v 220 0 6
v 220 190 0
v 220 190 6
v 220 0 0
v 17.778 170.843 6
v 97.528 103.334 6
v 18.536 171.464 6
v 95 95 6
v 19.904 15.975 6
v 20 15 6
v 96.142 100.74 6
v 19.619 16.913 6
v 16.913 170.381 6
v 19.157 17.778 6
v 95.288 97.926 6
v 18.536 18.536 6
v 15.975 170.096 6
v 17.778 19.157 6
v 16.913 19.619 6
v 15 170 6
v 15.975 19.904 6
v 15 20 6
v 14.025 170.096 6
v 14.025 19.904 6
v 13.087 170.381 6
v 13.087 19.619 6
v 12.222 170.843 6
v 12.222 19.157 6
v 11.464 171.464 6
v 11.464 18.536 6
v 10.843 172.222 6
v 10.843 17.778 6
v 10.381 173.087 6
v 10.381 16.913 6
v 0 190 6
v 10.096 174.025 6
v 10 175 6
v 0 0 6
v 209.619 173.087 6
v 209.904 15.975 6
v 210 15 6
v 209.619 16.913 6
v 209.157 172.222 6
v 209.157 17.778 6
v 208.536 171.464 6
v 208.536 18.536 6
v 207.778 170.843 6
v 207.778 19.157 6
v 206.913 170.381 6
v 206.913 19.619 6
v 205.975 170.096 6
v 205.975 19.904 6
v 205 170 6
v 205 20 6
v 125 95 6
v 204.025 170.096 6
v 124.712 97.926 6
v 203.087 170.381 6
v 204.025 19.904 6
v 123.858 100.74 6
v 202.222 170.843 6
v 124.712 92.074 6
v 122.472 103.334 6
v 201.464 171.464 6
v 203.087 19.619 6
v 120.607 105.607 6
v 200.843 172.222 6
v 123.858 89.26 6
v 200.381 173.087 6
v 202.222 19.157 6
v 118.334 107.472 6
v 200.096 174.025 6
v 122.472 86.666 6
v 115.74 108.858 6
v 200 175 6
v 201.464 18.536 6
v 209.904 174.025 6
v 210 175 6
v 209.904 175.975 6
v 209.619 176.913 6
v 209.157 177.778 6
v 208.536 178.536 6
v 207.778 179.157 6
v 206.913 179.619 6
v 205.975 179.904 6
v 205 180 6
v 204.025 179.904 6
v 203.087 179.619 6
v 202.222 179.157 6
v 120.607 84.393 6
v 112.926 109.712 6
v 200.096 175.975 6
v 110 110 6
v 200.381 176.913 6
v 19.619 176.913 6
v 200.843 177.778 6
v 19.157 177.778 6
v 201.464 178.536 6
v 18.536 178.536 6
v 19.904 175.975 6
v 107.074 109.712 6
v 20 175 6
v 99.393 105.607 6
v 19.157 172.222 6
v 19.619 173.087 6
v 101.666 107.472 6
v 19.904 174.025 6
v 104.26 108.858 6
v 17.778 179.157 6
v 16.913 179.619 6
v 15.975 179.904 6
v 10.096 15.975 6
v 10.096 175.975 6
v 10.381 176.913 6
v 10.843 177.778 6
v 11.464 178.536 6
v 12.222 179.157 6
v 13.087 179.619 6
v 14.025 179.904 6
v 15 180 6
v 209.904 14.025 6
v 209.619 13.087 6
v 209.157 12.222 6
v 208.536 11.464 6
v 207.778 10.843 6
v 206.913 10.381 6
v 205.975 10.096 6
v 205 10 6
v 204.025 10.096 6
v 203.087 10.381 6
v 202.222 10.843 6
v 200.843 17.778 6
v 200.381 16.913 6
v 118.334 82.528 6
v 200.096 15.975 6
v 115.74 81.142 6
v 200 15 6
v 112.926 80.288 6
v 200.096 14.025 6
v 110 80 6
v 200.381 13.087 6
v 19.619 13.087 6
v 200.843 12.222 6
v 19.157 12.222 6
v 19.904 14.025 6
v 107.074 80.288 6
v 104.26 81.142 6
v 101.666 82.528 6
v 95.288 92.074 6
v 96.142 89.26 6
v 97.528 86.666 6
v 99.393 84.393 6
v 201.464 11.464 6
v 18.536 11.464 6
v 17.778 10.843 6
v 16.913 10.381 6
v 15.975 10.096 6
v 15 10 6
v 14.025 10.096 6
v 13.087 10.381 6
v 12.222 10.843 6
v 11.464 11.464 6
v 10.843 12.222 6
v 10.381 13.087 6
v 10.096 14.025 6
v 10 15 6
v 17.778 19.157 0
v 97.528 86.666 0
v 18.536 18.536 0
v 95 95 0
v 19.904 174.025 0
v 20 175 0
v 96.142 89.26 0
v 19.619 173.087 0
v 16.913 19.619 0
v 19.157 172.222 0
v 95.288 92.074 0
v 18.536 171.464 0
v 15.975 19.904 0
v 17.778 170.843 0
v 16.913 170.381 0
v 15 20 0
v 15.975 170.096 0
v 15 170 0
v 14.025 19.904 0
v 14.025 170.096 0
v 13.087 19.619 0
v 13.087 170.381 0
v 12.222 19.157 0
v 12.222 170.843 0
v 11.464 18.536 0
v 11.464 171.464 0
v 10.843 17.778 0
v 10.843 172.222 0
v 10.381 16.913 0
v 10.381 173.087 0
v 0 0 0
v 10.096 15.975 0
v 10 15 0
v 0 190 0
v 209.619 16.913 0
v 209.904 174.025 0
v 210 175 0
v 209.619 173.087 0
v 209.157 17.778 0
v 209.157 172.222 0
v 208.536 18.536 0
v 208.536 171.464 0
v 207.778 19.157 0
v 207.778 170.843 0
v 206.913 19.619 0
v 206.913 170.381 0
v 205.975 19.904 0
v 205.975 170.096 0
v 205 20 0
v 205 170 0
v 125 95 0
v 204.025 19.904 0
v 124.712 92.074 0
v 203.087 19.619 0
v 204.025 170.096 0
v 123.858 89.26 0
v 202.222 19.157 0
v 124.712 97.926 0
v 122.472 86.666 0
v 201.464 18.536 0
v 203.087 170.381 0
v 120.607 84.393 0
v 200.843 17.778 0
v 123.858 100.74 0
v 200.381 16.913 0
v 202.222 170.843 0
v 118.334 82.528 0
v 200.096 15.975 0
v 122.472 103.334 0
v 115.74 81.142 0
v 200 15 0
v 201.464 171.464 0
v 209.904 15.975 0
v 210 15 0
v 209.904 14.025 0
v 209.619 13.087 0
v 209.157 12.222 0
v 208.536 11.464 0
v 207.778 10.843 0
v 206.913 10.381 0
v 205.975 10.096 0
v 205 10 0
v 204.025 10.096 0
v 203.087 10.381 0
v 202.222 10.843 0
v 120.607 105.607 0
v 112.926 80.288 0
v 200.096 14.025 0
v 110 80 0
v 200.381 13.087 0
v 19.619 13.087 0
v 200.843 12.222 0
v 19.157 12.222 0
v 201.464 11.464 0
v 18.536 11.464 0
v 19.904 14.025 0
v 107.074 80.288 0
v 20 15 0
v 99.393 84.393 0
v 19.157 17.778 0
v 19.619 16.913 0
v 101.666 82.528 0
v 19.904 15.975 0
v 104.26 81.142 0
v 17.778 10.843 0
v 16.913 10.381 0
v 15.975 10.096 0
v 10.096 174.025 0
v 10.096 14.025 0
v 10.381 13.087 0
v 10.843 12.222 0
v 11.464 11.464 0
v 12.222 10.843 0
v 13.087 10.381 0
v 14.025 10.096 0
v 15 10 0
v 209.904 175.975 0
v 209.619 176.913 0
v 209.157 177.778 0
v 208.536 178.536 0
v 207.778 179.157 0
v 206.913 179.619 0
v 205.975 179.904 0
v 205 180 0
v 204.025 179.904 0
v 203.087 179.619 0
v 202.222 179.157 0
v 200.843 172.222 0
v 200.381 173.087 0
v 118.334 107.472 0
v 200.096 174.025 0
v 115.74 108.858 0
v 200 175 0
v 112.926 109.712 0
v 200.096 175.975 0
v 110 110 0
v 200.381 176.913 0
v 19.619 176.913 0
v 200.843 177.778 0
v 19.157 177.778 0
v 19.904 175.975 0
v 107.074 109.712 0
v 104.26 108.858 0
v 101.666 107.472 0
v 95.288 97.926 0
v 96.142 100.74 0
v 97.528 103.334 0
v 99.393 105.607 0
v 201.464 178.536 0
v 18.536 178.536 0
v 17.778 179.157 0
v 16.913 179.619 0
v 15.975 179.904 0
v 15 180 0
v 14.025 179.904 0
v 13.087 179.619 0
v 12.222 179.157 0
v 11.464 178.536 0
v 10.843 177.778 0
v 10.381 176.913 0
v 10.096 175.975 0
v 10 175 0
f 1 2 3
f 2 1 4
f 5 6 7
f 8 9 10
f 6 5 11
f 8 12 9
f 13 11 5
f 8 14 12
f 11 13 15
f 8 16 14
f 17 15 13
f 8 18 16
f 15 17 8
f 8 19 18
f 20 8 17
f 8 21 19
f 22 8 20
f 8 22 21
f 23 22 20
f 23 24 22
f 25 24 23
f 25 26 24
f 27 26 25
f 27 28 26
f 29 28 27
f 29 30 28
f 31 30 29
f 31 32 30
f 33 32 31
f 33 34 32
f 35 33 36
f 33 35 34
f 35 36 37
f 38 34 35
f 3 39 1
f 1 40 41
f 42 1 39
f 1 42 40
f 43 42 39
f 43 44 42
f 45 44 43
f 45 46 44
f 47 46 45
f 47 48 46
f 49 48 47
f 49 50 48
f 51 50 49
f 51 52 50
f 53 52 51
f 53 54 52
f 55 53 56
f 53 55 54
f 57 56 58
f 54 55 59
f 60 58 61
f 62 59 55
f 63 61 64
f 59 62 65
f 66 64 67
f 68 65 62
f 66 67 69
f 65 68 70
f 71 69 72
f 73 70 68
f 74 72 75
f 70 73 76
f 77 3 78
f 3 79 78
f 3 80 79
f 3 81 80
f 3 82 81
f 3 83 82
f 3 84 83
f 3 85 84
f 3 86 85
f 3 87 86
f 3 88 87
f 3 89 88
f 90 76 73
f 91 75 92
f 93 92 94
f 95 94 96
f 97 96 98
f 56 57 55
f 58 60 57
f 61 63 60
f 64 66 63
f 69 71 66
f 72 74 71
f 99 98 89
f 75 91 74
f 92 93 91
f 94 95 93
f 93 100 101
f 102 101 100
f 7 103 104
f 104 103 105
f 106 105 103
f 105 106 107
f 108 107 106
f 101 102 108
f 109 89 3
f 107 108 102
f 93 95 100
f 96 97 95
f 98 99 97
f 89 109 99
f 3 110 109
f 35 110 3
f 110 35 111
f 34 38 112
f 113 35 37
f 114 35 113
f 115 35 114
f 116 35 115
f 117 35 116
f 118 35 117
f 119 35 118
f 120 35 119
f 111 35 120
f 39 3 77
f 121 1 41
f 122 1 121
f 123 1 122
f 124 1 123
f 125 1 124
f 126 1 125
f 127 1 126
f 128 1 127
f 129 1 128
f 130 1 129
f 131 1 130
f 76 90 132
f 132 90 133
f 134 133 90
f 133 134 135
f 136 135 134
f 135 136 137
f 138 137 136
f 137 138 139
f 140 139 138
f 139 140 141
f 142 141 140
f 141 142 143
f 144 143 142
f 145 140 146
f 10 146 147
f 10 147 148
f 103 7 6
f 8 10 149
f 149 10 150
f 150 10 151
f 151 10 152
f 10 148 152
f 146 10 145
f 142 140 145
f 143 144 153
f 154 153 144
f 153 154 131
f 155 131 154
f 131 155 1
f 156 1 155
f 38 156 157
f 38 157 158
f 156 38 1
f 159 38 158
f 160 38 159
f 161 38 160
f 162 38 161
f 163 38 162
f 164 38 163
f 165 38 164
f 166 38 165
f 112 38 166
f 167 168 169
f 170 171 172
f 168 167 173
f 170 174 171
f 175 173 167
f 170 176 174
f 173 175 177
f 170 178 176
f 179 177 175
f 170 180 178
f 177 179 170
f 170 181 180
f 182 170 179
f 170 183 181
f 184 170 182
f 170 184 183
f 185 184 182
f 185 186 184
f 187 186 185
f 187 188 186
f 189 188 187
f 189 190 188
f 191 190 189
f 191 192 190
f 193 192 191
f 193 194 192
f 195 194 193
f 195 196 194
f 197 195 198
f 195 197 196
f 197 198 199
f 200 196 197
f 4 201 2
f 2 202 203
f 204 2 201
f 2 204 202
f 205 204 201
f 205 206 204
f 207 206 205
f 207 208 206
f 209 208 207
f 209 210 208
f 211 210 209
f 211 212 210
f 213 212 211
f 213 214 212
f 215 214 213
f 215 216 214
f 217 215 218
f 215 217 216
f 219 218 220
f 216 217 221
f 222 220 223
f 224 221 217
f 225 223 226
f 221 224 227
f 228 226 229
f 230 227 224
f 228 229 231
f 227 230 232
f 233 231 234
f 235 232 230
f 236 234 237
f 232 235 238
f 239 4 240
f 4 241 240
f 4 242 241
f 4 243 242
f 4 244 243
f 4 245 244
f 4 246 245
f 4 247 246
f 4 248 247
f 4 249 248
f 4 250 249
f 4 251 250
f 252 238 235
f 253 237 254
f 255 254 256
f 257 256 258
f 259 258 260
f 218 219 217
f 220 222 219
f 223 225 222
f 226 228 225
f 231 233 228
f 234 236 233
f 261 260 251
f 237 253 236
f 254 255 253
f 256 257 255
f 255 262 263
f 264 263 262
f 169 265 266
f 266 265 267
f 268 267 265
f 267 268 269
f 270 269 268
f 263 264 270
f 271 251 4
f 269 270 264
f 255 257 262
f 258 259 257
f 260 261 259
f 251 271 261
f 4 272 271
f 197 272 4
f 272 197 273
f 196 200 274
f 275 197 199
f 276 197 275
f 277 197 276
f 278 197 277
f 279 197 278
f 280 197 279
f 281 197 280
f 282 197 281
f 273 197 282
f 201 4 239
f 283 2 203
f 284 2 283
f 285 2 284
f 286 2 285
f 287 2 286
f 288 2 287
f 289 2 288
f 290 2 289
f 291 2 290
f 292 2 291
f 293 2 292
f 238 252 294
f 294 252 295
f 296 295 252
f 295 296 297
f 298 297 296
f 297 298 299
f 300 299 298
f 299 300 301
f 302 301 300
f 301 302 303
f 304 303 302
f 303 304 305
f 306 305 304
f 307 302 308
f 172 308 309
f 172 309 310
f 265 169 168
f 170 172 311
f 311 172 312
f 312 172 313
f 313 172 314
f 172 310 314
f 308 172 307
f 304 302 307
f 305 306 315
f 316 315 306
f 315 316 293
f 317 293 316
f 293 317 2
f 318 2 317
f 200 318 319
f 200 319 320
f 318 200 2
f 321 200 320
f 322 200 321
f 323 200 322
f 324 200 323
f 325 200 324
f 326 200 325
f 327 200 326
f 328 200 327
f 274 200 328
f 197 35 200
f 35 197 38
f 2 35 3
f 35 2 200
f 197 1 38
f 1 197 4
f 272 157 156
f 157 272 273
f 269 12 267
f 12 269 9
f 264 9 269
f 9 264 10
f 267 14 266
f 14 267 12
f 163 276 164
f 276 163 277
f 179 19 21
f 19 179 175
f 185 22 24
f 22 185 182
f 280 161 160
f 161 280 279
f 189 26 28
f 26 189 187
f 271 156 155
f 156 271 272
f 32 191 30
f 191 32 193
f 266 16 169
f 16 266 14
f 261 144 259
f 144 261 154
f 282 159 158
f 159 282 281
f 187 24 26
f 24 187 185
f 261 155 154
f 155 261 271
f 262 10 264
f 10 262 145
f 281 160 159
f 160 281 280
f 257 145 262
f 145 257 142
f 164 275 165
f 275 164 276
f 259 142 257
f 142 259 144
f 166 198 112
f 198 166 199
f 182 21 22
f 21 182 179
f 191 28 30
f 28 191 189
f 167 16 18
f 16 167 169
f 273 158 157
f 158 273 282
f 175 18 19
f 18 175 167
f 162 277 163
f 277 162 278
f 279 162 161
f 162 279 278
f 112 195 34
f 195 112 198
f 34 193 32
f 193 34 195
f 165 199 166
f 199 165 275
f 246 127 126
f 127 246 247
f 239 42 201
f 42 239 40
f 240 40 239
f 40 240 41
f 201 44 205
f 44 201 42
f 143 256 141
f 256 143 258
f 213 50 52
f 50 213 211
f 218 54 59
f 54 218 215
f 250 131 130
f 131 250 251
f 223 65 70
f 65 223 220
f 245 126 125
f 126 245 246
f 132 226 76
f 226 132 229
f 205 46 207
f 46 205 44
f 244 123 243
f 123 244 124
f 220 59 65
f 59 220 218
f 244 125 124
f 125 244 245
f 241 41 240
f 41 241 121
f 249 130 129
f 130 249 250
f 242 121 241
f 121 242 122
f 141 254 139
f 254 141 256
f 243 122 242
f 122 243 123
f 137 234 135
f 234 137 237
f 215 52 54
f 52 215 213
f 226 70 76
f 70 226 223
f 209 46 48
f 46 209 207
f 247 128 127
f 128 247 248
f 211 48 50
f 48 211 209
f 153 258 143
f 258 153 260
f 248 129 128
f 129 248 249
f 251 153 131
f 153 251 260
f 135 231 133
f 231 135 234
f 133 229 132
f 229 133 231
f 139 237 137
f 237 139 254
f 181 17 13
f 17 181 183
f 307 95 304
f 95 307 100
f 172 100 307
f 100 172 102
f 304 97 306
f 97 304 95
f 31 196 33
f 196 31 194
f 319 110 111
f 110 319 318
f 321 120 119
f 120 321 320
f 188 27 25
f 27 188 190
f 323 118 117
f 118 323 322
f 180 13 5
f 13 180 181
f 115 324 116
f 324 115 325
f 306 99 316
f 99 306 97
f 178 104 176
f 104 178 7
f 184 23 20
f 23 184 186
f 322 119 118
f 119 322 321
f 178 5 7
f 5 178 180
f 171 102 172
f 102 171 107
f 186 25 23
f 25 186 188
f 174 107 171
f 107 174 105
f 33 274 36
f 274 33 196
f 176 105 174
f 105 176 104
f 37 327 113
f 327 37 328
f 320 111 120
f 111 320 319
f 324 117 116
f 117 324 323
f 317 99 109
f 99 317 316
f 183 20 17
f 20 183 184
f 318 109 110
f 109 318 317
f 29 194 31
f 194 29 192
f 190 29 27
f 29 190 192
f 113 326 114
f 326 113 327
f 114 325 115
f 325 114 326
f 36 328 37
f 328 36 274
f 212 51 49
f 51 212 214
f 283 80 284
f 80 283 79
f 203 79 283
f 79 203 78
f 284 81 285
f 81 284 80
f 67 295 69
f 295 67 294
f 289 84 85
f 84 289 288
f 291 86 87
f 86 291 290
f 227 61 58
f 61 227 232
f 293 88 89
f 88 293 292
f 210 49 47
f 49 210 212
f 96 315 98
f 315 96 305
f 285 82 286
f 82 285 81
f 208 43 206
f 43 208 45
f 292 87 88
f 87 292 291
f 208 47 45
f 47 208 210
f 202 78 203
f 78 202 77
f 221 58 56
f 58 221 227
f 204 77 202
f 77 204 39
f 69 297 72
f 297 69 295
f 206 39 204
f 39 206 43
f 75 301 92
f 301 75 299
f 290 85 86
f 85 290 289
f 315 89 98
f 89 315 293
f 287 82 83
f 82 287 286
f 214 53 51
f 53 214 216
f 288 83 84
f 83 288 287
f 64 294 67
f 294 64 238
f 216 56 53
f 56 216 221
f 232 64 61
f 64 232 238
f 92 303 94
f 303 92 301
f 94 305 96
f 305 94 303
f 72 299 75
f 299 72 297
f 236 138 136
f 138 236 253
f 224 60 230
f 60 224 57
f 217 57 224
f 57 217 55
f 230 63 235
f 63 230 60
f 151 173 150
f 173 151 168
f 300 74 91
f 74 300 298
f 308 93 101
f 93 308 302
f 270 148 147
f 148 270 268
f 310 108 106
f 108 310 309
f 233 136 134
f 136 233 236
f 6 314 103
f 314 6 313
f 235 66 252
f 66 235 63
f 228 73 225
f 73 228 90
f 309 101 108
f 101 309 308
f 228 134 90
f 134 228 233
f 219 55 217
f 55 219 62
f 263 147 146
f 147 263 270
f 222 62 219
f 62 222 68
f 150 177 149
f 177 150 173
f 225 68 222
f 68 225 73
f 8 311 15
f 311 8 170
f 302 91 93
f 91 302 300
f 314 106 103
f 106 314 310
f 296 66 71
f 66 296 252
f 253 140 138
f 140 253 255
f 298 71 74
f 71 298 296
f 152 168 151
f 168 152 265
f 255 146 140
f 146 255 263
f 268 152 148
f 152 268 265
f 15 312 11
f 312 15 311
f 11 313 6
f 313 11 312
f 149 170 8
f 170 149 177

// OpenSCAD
$fn = 32;

// ----------------------------------------------------------------------
// Big plate: 200-250 mm adapter plate
// ----------------------------------------------------------------------

// --- parameters (mm) ---
plate_l = 220;            // plate length, X
plate_w = 190;            // plate width, Y
plate_t = 6;              // plate thickness, Z
corner_d = 10;            // corner hole diameter
corner_in = 15;           // corner hole inset from the edges
bore_d = 30;              // central bore

difference() {
  cube([plate_l, plate_w, plate_t]);
  translate([corner_in, corner_in, -1]) cylinder(h = plate_t + 2, d = corner_d);
  translate([plate_l - corner_in, corner_in, -1]) cylinder(h = plate_t + 2, d = corner_d);
  translate([corner_in, plate_w - corner_in, -1]) cylinder(h = plate_t + 2, d = corner_d);
  translate([plate_l - corner_in, plate_w - corner_in, -1]) cylinder(h = plate_t + 2, d = corner_d);
  translate([plate_l / 2, plate_w / 2, -1]) cylinder(h = plate_t + 2, d = bore_d);
}
